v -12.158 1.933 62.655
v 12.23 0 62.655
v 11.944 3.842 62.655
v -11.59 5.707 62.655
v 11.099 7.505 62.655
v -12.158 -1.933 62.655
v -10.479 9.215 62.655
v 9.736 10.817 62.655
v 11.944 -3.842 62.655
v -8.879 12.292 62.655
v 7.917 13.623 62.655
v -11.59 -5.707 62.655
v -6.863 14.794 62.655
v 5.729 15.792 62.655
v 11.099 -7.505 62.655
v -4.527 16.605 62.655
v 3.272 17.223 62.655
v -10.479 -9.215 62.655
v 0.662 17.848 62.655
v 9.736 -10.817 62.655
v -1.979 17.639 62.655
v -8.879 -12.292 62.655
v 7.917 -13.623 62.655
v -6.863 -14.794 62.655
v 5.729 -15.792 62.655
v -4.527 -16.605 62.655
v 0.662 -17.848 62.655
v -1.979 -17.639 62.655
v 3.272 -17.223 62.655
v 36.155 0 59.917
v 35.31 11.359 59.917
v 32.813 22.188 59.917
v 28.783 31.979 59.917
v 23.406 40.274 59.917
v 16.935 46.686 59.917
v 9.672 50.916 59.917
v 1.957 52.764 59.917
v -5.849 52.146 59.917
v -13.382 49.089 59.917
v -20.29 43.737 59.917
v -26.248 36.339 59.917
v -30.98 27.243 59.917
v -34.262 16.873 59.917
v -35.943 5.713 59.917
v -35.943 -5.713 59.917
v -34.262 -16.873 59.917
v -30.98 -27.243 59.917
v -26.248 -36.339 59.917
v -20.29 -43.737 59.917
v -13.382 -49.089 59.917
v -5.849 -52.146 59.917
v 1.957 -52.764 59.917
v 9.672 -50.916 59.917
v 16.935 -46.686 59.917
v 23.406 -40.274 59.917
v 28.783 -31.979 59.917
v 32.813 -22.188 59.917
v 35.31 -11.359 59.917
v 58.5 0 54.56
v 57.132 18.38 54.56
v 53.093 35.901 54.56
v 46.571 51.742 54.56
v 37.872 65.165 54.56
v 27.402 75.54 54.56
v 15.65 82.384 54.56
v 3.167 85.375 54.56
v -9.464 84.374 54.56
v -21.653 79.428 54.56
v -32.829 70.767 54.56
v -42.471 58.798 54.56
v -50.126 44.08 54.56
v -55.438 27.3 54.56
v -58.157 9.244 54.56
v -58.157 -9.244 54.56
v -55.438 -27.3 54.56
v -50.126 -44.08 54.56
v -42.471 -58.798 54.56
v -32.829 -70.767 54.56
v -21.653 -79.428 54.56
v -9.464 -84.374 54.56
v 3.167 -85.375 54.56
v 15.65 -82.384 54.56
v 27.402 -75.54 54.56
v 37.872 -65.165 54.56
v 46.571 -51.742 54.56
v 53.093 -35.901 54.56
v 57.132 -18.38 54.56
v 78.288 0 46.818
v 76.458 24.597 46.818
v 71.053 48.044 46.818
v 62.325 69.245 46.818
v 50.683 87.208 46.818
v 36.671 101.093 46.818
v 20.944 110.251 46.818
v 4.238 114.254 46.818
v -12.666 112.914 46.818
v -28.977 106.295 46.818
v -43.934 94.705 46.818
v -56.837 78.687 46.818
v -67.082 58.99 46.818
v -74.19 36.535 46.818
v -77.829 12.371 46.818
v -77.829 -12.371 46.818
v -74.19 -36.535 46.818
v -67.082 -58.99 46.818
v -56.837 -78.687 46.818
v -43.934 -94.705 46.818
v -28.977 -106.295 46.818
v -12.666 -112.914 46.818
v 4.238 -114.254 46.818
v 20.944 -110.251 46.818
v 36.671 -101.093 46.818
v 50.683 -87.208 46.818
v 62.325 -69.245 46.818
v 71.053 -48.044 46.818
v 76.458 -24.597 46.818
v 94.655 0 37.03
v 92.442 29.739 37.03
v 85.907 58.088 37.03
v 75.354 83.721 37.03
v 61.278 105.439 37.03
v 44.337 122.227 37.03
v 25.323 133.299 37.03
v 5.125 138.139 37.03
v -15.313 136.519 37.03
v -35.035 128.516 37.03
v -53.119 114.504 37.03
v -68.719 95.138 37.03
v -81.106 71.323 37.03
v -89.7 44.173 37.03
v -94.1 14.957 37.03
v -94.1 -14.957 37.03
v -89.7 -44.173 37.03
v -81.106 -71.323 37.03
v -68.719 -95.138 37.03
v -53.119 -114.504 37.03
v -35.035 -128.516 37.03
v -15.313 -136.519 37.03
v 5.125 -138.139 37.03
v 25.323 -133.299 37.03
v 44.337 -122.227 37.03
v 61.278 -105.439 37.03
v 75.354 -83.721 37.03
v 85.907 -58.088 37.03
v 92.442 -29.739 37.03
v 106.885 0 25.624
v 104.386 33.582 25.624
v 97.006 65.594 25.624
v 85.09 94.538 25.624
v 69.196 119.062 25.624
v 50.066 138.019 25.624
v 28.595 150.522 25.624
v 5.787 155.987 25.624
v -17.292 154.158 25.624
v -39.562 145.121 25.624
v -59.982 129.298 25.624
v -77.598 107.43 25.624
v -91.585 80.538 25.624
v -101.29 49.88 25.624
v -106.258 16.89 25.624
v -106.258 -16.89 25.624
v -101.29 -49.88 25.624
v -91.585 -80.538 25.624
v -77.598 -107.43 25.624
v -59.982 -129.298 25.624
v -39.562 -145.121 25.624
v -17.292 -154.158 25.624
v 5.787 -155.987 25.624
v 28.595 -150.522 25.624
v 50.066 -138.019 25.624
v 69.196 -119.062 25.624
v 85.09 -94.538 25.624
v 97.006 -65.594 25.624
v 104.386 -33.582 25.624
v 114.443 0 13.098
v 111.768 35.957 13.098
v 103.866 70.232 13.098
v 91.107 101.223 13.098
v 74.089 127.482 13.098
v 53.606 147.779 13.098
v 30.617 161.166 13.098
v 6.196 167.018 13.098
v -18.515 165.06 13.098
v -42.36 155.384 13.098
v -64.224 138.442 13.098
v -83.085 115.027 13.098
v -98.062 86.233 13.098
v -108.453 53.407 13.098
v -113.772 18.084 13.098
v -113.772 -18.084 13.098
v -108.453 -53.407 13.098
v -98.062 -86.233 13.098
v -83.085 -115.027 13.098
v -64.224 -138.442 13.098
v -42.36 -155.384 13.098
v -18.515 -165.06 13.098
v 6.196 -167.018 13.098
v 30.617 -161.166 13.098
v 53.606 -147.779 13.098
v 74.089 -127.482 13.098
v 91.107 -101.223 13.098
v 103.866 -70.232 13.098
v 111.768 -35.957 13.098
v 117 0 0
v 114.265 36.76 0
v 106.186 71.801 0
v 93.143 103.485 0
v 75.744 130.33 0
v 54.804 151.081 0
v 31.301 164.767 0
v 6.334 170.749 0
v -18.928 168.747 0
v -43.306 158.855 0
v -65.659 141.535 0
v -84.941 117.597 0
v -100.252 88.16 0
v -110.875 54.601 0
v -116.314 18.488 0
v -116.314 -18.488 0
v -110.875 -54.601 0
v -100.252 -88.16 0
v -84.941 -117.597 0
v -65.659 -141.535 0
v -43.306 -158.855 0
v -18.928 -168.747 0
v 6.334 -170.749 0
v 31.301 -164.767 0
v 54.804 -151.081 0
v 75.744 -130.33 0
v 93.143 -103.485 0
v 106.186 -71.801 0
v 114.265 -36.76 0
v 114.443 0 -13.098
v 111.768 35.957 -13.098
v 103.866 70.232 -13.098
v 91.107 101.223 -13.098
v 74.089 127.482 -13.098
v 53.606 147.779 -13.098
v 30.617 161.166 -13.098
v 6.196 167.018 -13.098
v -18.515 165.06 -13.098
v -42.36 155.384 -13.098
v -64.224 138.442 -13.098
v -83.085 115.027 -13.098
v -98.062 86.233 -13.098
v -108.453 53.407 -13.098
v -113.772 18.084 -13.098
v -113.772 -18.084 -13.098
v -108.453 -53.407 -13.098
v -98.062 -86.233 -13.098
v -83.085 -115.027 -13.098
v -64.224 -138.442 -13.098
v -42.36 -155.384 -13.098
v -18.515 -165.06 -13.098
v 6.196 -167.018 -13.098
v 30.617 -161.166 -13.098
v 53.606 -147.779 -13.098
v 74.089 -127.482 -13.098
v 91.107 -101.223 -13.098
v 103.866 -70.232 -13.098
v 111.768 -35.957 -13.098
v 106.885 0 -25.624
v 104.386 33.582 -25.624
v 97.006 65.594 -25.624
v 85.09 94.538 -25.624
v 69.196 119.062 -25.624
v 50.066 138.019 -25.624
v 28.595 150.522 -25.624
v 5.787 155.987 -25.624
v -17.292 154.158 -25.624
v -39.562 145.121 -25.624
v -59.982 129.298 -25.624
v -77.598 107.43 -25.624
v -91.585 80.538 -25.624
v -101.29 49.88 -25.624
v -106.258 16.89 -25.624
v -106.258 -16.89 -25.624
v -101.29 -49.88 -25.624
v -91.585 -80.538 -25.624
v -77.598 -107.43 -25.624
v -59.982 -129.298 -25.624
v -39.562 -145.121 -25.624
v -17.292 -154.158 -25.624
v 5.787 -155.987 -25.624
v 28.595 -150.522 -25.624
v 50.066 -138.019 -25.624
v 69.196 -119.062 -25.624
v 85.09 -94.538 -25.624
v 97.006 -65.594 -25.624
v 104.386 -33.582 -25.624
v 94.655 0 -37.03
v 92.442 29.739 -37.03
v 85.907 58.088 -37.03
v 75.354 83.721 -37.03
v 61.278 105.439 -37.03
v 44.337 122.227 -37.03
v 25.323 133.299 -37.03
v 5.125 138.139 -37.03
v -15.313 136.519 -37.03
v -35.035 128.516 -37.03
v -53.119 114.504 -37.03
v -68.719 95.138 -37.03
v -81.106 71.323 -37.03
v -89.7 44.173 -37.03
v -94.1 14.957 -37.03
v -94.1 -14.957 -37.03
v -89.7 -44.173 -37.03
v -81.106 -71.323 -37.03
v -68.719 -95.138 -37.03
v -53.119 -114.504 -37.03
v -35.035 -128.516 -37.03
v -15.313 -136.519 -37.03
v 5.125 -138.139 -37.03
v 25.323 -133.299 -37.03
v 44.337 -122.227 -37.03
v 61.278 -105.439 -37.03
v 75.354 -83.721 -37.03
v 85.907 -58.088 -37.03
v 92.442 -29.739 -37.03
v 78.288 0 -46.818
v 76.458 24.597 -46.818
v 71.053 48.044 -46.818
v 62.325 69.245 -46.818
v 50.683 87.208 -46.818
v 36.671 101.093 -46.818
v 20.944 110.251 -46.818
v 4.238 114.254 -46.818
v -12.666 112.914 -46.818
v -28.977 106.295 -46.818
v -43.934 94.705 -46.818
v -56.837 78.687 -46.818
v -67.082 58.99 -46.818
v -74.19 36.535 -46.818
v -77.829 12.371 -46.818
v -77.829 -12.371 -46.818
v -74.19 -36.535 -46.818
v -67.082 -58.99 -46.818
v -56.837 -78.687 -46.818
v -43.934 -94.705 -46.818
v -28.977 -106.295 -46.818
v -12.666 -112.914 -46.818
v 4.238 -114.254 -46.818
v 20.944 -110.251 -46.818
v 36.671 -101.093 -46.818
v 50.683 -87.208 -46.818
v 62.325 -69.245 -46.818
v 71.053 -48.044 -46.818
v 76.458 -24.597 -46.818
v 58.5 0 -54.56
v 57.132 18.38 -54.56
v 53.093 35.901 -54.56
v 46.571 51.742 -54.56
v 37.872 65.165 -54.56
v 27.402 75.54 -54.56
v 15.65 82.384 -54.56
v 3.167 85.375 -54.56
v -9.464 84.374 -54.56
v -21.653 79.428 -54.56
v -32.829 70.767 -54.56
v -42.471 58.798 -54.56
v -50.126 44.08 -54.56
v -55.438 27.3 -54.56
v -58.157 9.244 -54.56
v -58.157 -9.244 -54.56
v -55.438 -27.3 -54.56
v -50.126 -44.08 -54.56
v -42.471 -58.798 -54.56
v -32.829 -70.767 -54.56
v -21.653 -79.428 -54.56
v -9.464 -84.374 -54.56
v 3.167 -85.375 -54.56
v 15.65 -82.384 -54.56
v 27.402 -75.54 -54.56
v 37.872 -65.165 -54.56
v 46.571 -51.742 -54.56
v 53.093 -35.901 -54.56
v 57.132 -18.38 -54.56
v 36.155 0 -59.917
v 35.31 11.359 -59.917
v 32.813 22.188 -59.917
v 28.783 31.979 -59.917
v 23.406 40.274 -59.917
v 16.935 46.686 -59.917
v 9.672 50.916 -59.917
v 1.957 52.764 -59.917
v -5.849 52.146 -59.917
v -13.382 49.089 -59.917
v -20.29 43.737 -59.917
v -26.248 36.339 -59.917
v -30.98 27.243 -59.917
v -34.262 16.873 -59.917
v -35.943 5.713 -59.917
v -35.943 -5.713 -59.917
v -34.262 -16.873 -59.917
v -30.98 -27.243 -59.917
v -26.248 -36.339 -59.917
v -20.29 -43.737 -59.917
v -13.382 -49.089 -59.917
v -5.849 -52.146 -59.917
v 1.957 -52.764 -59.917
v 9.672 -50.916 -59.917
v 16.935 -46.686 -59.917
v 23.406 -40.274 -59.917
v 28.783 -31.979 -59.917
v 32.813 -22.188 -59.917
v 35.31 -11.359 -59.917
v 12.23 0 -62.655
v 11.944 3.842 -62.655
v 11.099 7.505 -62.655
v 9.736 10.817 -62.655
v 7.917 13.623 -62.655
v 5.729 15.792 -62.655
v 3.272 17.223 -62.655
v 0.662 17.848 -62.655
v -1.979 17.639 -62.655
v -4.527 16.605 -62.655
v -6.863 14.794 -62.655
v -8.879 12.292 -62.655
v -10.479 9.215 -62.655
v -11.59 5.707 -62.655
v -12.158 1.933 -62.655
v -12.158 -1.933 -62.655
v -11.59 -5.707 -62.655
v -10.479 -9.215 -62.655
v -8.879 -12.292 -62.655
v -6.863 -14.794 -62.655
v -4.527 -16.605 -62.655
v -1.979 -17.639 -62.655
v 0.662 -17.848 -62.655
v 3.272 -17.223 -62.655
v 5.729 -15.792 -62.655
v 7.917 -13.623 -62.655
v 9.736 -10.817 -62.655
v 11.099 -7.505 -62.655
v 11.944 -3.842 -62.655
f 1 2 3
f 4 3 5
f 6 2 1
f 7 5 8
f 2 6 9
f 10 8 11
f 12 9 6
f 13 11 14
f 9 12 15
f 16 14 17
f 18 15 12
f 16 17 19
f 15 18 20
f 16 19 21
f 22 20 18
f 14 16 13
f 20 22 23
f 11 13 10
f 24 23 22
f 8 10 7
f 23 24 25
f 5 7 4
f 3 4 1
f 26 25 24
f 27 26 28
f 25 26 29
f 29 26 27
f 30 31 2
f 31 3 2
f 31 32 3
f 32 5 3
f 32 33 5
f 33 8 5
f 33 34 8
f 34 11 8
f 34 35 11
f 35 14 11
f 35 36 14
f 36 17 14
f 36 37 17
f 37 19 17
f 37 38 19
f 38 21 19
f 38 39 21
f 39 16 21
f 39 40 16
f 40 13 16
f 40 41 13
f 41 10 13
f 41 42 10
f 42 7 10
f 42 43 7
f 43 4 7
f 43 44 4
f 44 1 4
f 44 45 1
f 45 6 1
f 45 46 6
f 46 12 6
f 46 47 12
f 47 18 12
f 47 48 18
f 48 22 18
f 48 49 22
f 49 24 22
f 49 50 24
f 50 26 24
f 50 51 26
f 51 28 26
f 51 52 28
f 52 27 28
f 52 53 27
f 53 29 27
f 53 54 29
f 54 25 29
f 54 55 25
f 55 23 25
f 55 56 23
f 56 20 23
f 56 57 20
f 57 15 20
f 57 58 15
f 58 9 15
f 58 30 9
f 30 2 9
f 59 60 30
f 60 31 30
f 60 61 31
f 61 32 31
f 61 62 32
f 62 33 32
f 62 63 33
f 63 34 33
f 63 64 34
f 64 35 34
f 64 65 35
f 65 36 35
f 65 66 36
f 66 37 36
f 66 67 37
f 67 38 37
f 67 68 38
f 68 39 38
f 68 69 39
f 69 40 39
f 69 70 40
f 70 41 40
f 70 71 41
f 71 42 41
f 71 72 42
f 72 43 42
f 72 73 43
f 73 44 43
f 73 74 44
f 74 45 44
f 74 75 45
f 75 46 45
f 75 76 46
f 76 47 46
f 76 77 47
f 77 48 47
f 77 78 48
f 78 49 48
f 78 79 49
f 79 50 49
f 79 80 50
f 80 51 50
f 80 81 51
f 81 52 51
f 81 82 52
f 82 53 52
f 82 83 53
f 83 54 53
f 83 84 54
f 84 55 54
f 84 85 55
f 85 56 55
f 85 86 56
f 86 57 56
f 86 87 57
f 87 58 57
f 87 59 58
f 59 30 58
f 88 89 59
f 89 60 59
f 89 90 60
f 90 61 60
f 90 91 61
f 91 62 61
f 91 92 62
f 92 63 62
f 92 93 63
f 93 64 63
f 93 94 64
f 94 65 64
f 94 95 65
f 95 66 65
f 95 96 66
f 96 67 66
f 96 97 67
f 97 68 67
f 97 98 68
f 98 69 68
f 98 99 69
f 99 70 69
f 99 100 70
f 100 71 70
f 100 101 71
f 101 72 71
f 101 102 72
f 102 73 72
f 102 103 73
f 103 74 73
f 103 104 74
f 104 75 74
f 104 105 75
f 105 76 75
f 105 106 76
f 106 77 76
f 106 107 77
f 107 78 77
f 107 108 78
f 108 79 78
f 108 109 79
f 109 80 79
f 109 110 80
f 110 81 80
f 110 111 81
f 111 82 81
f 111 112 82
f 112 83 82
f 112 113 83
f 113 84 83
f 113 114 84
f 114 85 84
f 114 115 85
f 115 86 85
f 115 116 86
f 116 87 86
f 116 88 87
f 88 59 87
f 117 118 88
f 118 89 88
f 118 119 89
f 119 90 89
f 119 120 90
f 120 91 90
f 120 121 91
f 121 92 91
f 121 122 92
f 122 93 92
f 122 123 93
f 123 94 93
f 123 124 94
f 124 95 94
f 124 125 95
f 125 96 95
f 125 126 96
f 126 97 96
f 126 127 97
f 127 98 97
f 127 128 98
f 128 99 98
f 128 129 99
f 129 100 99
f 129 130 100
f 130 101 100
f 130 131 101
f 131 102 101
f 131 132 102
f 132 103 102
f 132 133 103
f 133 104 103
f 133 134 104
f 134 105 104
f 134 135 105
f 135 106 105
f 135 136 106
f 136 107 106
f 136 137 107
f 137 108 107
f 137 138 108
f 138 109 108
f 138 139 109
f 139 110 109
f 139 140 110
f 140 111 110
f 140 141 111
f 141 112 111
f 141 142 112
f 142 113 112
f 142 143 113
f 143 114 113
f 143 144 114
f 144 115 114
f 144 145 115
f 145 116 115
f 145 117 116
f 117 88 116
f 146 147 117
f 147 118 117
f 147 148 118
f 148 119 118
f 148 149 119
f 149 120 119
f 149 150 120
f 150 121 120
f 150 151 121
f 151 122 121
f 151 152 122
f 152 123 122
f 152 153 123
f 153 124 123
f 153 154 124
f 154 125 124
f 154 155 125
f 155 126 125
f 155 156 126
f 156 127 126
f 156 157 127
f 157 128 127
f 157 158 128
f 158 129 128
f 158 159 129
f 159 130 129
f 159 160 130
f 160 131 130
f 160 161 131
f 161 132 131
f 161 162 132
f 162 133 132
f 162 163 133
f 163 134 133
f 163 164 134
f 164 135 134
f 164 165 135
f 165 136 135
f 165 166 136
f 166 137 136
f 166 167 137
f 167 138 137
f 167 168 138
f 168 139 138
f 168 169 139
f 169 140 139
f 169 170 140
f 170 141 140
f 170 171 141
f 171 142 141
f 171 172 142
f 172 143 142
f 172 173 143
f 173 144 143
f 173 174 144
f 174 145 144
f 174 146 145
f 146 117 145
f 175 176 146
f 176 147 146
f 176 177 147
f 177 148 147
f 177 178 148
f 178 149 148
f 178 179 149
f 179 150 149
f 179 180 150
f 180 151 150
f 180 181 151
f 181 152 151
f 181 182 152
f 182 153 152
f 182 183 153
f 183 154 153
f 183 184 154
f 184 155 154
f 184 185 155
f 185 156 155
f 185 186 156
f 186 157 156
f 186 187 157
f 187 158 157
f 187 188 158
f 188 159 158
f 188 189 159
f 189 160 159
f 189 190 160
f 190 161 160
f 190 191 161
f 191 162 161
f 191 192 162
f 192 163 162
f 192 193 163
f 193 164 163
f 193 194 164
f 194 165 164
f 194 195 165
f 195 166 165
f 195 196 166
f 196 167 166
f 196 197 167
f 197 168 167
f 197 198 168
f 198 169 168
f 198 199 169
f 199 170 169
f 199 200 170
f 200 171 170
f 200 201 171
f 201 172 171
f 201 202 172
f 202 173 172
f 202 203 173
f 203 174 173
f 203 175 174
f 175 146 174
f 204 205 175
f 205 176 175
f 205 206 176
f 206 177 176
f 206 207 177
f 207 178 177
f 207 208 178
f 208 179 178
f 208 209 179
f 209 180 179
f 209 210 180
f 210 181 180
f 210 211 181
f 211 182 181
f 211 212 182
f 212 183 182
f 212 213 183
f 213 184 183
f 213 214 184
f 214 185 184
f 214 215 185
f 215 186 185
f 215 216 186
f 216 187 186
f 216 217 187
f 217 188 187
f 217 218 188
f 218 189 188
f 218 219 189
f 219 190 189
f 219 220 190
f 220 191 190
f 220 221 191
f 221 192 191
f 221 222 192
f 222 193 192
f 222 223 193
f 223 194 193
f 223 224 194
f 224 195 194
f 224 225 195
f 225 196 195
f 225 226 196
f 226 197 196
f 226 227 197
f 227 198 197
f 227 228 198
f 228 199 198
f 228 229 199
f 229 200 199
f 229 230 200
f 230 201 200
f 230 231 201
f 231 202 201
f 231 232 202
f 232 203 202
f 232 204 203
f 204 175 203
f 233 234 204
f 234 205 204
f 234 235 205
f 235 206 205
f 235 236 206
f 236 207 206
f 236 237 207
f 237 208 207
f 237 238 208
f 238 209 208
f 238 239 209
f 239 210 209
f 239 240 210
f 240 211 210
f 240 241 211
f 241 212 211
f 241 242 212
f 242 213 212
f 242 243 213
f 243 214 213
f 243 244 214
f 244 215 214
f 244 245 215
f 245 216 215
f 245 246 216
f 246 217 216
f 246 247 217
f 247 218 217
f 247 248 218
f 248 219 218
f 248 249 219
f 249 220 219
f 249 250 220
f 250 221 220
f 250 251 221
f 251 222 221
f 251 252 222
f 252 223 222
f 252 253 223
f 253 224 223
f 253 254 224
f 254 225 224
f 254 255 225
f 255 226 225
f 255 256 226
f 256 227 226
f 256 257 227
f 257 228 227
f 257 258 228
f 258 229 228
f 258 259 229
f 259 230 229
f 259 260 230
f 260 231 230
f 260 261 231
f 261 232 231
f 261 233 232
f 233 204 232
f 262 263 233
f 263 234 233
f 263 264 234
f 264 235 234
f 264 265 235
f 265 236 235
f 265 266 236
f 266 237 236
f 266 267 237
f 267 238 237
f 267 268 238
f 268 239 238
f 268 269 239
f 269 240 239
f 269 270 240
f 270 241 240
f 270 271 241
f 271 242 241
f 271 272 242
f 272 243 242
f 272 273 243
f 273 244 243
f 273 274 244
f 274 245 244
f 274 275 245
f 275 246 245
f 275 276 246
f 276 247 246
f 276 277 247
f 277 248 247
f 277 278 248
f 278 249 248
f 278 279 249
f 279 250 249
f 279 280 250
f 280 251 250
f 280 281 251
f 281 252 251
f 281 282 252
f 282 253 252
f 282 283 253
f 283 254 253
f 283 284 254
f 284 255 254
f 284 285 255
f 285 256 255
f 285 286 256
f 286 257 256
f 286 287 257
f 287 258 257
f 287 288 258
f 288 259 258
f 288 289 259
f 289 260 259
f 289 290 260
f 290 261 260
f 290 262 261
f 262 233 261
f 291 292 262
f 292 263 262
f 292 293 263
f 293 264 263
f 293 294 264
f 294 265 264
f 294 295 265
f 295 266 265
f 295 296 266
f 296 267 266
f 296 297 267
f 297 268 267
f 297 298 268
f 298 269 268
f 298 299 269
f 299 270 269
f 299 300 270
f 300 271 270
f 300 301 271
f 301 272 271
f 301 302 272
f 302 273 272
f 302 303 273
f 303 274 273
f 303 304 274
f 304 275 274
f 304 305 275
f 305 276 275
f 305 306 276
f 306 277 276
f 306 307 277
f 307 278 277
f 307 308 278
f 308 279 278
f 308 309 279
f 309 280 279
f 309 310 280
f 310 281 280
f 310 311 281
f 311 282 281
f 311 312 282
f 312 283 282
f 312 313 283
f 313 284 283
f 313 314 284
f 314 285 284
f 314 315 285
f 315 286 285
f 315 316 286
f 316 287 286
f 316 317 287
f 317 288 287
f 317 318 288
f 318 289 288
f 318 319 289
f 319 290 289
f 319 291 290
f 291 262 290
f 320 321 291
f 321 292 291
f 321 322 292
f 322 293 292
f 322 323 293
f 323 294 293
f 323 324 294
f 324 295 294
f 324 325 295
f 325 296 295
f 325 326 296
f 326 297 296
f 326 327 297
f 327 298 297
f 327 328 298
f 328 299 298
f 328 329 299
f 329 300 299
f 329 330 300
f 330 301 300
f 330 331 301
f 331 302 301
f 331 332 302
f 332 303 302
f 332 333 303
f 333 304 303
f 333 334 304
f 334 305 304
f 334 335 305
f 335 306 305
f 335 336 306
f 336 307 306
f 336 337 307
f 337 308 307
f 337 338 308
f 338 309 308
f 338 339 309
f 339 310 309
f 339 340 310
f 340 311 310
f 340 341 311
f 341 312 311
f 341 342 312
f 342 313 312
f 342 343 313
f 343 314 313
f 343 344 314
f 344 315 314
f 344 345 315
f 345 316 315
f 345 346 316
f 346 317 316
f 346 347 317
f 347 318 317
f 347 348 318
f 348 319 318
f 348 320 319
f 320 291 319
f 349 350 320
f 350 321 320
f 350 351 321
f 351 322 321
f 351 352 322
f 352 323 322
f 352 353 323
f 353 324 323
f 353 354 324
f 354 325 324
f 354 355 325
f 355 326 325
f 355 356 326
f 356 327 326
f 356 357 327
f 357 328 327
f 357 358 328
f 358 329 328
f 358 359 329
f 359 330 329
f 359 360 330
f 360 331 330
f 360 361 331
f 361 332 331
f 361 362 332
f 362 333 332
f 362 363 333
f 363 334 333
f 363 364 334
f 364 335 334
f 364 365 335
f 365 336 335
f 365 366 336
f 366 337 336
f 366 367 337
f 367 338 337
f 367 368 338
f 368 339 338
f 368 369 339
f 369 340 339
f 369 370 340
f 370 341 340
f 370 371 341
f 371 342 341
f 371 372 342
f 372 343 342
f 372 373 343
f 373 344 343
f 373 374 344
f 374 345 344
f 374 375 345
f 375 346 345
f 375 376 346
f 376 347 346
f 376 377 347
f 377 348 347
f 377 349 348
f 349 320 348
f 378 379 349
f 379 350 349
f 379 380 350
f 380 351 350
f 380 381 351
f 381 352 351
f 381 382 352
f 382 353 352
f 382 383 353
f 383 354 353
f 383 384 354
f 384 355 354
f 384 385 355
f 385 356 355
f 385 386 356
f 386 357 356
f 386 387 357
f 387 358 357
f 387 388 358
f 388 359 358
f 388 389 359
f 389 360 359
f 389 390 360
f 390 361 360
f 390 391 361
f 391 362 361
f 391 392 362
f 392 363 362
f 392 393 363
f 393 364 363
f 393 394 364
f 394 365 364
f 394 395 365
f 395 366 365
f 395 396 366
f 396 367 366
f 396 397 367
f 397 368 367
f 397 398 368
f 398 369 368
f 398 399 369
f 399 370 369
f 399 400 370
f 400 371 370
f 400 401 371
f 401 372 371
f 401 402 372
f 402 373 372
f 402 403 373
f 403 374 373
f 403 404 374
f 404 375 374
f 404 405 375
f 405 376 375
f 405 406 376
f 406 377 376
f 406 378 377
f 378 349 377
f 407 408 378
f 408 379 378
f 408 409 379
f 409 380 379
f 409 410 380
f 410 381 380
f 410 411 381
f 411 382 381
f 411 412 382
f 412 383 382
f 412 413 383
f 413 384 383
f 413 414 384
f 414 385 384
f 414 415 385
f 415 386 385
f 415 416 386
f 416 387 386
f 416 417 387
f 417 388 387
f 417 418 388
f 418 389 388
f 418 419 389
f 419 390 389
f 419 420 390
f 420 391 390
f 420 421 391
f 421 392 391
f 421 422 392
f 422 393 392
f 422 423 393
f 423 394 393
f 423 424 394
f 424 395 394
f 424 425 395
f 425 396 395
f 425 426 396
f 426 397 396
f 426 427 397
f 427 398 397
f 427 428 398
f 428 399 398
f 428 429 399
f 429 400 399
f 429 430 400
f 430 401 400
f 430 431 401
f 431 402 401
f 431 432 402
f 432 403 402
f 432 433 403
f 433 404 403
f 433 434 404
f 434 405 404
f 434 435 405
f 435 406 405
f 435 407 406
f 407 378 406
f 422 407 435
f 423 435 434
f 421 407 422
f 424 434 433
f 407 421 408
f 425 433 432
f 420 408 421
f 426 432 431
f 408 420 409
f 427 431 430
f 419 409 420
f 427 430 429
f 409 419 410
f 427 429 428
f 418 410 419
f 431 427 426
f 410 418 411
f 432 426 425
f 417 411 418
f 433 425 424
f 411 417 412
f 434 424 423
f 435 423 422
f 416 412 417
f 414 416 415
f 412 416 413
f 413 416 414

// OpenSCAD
// Generated by SolidPython 1.0.1 on 2020-07-29 00:46:51


scale(v = [13, 19, 7]) {
	sphere(r = 9);
}
/***********************************************
*********      SolidPython code:      **********
************************************************
 
# import packages: SolidPython
from solid import *
from solid.utils import *
from itertools import chain, combinations, permutations


class Resize:

    def __init__(self, scad_file):
        self.scad_file = scad_file
        #self.scad_file = import_scad(scad_file)
        # cone/cylinder param:
        self.r1 = 0
        self.r2 = 0
        self.h = 0
        # rectangular prism param:
        self.w = 0
        self.l = 0
        # ellipse param:
        self.r = 0

    # import OpenScad code (file name corresponds to shape)


    # classify shape + parameters
    def assign(self, param1, param2, param3):
        if self.scad_file == 'cone.scad':
            self.r1 = param1
            self.r2 = param2
            self.h = param3
        elif self.scad_file == 'cylinder.scad':
            self.r1 = param1
            self.r2 = param2
            self.h = param3
        elif self.scad_file == 'rectangularPrism.scad':
            self.h = param1
            self.l = param2
            self.w = param3
        else:
            self.r = param1
            self.h = param2

    # resize parameters
    def iterate(self):
        x = range(3, 20, 2)
        i = 1
        if self.scad_file == 'cone.scad':
            tempList = list(permutations(x, 2))
            for temp in tempList:
                param1 = temp[0]
                param2 = temp[1]
                filepath = 'produced_scad_files/' + 'cone' + str(param1) + '_' + str(param2) + '_' + '.scad'
                scad_render_to_file(cylinder(h=param1, r1=param2, r2=0), filepath)

        elif self.scad_file == 'cylinder.scad':
            tempList = list(permutations(x, 3))
            for temp in tempList:
                param1 = temp[0]
                param2 = temp[1]
                filepath = 'produced_scad_files/' + 'cylinder' + str(param1) + '_' + str(param2) + '_' + '.scad'
                scad_render_to_file(cylinder(h=param1, r1=param2, r2=param2), filepath)

        elif self.scad_file == 'rectangularPrism.scad':
            tempList = list(permutations(x, 3))
            for temp in tempList:
                param1 = temp[0]
                param2 = temp[1]
                param3 = temp[2]
                filepath = 'produced_scad_files/' + 'rectangularPrism' + str(param1) + '_' + str(param2) + '_' + str(
                    param3) + '.scad'
                scad_render_to_file(cube(size=(param1, param2, param3)), filepath)

        elif self.scad_file == 'ellipse.scad':
            tempList = list(permutations(x, 4))
            for temp in tempList:
                param1 = temp[0]
                param2 = temp[1]
                param3 = temp[2]
                param4 = temp[3]
                filepath = 'produced_scad_files/' + 'ellipse' + str(param1) + '_' + str(param2) + '_' + str(param3) + '_' + str(param4) + '.scad'
                scad_render_to_file(scale([param1, param2, param3])(sphere(r=param4)), filepath)

    def render_to_scadfile(self):
        scad_render_to_file(scad, 'example.scad') 
 
************************************************/
